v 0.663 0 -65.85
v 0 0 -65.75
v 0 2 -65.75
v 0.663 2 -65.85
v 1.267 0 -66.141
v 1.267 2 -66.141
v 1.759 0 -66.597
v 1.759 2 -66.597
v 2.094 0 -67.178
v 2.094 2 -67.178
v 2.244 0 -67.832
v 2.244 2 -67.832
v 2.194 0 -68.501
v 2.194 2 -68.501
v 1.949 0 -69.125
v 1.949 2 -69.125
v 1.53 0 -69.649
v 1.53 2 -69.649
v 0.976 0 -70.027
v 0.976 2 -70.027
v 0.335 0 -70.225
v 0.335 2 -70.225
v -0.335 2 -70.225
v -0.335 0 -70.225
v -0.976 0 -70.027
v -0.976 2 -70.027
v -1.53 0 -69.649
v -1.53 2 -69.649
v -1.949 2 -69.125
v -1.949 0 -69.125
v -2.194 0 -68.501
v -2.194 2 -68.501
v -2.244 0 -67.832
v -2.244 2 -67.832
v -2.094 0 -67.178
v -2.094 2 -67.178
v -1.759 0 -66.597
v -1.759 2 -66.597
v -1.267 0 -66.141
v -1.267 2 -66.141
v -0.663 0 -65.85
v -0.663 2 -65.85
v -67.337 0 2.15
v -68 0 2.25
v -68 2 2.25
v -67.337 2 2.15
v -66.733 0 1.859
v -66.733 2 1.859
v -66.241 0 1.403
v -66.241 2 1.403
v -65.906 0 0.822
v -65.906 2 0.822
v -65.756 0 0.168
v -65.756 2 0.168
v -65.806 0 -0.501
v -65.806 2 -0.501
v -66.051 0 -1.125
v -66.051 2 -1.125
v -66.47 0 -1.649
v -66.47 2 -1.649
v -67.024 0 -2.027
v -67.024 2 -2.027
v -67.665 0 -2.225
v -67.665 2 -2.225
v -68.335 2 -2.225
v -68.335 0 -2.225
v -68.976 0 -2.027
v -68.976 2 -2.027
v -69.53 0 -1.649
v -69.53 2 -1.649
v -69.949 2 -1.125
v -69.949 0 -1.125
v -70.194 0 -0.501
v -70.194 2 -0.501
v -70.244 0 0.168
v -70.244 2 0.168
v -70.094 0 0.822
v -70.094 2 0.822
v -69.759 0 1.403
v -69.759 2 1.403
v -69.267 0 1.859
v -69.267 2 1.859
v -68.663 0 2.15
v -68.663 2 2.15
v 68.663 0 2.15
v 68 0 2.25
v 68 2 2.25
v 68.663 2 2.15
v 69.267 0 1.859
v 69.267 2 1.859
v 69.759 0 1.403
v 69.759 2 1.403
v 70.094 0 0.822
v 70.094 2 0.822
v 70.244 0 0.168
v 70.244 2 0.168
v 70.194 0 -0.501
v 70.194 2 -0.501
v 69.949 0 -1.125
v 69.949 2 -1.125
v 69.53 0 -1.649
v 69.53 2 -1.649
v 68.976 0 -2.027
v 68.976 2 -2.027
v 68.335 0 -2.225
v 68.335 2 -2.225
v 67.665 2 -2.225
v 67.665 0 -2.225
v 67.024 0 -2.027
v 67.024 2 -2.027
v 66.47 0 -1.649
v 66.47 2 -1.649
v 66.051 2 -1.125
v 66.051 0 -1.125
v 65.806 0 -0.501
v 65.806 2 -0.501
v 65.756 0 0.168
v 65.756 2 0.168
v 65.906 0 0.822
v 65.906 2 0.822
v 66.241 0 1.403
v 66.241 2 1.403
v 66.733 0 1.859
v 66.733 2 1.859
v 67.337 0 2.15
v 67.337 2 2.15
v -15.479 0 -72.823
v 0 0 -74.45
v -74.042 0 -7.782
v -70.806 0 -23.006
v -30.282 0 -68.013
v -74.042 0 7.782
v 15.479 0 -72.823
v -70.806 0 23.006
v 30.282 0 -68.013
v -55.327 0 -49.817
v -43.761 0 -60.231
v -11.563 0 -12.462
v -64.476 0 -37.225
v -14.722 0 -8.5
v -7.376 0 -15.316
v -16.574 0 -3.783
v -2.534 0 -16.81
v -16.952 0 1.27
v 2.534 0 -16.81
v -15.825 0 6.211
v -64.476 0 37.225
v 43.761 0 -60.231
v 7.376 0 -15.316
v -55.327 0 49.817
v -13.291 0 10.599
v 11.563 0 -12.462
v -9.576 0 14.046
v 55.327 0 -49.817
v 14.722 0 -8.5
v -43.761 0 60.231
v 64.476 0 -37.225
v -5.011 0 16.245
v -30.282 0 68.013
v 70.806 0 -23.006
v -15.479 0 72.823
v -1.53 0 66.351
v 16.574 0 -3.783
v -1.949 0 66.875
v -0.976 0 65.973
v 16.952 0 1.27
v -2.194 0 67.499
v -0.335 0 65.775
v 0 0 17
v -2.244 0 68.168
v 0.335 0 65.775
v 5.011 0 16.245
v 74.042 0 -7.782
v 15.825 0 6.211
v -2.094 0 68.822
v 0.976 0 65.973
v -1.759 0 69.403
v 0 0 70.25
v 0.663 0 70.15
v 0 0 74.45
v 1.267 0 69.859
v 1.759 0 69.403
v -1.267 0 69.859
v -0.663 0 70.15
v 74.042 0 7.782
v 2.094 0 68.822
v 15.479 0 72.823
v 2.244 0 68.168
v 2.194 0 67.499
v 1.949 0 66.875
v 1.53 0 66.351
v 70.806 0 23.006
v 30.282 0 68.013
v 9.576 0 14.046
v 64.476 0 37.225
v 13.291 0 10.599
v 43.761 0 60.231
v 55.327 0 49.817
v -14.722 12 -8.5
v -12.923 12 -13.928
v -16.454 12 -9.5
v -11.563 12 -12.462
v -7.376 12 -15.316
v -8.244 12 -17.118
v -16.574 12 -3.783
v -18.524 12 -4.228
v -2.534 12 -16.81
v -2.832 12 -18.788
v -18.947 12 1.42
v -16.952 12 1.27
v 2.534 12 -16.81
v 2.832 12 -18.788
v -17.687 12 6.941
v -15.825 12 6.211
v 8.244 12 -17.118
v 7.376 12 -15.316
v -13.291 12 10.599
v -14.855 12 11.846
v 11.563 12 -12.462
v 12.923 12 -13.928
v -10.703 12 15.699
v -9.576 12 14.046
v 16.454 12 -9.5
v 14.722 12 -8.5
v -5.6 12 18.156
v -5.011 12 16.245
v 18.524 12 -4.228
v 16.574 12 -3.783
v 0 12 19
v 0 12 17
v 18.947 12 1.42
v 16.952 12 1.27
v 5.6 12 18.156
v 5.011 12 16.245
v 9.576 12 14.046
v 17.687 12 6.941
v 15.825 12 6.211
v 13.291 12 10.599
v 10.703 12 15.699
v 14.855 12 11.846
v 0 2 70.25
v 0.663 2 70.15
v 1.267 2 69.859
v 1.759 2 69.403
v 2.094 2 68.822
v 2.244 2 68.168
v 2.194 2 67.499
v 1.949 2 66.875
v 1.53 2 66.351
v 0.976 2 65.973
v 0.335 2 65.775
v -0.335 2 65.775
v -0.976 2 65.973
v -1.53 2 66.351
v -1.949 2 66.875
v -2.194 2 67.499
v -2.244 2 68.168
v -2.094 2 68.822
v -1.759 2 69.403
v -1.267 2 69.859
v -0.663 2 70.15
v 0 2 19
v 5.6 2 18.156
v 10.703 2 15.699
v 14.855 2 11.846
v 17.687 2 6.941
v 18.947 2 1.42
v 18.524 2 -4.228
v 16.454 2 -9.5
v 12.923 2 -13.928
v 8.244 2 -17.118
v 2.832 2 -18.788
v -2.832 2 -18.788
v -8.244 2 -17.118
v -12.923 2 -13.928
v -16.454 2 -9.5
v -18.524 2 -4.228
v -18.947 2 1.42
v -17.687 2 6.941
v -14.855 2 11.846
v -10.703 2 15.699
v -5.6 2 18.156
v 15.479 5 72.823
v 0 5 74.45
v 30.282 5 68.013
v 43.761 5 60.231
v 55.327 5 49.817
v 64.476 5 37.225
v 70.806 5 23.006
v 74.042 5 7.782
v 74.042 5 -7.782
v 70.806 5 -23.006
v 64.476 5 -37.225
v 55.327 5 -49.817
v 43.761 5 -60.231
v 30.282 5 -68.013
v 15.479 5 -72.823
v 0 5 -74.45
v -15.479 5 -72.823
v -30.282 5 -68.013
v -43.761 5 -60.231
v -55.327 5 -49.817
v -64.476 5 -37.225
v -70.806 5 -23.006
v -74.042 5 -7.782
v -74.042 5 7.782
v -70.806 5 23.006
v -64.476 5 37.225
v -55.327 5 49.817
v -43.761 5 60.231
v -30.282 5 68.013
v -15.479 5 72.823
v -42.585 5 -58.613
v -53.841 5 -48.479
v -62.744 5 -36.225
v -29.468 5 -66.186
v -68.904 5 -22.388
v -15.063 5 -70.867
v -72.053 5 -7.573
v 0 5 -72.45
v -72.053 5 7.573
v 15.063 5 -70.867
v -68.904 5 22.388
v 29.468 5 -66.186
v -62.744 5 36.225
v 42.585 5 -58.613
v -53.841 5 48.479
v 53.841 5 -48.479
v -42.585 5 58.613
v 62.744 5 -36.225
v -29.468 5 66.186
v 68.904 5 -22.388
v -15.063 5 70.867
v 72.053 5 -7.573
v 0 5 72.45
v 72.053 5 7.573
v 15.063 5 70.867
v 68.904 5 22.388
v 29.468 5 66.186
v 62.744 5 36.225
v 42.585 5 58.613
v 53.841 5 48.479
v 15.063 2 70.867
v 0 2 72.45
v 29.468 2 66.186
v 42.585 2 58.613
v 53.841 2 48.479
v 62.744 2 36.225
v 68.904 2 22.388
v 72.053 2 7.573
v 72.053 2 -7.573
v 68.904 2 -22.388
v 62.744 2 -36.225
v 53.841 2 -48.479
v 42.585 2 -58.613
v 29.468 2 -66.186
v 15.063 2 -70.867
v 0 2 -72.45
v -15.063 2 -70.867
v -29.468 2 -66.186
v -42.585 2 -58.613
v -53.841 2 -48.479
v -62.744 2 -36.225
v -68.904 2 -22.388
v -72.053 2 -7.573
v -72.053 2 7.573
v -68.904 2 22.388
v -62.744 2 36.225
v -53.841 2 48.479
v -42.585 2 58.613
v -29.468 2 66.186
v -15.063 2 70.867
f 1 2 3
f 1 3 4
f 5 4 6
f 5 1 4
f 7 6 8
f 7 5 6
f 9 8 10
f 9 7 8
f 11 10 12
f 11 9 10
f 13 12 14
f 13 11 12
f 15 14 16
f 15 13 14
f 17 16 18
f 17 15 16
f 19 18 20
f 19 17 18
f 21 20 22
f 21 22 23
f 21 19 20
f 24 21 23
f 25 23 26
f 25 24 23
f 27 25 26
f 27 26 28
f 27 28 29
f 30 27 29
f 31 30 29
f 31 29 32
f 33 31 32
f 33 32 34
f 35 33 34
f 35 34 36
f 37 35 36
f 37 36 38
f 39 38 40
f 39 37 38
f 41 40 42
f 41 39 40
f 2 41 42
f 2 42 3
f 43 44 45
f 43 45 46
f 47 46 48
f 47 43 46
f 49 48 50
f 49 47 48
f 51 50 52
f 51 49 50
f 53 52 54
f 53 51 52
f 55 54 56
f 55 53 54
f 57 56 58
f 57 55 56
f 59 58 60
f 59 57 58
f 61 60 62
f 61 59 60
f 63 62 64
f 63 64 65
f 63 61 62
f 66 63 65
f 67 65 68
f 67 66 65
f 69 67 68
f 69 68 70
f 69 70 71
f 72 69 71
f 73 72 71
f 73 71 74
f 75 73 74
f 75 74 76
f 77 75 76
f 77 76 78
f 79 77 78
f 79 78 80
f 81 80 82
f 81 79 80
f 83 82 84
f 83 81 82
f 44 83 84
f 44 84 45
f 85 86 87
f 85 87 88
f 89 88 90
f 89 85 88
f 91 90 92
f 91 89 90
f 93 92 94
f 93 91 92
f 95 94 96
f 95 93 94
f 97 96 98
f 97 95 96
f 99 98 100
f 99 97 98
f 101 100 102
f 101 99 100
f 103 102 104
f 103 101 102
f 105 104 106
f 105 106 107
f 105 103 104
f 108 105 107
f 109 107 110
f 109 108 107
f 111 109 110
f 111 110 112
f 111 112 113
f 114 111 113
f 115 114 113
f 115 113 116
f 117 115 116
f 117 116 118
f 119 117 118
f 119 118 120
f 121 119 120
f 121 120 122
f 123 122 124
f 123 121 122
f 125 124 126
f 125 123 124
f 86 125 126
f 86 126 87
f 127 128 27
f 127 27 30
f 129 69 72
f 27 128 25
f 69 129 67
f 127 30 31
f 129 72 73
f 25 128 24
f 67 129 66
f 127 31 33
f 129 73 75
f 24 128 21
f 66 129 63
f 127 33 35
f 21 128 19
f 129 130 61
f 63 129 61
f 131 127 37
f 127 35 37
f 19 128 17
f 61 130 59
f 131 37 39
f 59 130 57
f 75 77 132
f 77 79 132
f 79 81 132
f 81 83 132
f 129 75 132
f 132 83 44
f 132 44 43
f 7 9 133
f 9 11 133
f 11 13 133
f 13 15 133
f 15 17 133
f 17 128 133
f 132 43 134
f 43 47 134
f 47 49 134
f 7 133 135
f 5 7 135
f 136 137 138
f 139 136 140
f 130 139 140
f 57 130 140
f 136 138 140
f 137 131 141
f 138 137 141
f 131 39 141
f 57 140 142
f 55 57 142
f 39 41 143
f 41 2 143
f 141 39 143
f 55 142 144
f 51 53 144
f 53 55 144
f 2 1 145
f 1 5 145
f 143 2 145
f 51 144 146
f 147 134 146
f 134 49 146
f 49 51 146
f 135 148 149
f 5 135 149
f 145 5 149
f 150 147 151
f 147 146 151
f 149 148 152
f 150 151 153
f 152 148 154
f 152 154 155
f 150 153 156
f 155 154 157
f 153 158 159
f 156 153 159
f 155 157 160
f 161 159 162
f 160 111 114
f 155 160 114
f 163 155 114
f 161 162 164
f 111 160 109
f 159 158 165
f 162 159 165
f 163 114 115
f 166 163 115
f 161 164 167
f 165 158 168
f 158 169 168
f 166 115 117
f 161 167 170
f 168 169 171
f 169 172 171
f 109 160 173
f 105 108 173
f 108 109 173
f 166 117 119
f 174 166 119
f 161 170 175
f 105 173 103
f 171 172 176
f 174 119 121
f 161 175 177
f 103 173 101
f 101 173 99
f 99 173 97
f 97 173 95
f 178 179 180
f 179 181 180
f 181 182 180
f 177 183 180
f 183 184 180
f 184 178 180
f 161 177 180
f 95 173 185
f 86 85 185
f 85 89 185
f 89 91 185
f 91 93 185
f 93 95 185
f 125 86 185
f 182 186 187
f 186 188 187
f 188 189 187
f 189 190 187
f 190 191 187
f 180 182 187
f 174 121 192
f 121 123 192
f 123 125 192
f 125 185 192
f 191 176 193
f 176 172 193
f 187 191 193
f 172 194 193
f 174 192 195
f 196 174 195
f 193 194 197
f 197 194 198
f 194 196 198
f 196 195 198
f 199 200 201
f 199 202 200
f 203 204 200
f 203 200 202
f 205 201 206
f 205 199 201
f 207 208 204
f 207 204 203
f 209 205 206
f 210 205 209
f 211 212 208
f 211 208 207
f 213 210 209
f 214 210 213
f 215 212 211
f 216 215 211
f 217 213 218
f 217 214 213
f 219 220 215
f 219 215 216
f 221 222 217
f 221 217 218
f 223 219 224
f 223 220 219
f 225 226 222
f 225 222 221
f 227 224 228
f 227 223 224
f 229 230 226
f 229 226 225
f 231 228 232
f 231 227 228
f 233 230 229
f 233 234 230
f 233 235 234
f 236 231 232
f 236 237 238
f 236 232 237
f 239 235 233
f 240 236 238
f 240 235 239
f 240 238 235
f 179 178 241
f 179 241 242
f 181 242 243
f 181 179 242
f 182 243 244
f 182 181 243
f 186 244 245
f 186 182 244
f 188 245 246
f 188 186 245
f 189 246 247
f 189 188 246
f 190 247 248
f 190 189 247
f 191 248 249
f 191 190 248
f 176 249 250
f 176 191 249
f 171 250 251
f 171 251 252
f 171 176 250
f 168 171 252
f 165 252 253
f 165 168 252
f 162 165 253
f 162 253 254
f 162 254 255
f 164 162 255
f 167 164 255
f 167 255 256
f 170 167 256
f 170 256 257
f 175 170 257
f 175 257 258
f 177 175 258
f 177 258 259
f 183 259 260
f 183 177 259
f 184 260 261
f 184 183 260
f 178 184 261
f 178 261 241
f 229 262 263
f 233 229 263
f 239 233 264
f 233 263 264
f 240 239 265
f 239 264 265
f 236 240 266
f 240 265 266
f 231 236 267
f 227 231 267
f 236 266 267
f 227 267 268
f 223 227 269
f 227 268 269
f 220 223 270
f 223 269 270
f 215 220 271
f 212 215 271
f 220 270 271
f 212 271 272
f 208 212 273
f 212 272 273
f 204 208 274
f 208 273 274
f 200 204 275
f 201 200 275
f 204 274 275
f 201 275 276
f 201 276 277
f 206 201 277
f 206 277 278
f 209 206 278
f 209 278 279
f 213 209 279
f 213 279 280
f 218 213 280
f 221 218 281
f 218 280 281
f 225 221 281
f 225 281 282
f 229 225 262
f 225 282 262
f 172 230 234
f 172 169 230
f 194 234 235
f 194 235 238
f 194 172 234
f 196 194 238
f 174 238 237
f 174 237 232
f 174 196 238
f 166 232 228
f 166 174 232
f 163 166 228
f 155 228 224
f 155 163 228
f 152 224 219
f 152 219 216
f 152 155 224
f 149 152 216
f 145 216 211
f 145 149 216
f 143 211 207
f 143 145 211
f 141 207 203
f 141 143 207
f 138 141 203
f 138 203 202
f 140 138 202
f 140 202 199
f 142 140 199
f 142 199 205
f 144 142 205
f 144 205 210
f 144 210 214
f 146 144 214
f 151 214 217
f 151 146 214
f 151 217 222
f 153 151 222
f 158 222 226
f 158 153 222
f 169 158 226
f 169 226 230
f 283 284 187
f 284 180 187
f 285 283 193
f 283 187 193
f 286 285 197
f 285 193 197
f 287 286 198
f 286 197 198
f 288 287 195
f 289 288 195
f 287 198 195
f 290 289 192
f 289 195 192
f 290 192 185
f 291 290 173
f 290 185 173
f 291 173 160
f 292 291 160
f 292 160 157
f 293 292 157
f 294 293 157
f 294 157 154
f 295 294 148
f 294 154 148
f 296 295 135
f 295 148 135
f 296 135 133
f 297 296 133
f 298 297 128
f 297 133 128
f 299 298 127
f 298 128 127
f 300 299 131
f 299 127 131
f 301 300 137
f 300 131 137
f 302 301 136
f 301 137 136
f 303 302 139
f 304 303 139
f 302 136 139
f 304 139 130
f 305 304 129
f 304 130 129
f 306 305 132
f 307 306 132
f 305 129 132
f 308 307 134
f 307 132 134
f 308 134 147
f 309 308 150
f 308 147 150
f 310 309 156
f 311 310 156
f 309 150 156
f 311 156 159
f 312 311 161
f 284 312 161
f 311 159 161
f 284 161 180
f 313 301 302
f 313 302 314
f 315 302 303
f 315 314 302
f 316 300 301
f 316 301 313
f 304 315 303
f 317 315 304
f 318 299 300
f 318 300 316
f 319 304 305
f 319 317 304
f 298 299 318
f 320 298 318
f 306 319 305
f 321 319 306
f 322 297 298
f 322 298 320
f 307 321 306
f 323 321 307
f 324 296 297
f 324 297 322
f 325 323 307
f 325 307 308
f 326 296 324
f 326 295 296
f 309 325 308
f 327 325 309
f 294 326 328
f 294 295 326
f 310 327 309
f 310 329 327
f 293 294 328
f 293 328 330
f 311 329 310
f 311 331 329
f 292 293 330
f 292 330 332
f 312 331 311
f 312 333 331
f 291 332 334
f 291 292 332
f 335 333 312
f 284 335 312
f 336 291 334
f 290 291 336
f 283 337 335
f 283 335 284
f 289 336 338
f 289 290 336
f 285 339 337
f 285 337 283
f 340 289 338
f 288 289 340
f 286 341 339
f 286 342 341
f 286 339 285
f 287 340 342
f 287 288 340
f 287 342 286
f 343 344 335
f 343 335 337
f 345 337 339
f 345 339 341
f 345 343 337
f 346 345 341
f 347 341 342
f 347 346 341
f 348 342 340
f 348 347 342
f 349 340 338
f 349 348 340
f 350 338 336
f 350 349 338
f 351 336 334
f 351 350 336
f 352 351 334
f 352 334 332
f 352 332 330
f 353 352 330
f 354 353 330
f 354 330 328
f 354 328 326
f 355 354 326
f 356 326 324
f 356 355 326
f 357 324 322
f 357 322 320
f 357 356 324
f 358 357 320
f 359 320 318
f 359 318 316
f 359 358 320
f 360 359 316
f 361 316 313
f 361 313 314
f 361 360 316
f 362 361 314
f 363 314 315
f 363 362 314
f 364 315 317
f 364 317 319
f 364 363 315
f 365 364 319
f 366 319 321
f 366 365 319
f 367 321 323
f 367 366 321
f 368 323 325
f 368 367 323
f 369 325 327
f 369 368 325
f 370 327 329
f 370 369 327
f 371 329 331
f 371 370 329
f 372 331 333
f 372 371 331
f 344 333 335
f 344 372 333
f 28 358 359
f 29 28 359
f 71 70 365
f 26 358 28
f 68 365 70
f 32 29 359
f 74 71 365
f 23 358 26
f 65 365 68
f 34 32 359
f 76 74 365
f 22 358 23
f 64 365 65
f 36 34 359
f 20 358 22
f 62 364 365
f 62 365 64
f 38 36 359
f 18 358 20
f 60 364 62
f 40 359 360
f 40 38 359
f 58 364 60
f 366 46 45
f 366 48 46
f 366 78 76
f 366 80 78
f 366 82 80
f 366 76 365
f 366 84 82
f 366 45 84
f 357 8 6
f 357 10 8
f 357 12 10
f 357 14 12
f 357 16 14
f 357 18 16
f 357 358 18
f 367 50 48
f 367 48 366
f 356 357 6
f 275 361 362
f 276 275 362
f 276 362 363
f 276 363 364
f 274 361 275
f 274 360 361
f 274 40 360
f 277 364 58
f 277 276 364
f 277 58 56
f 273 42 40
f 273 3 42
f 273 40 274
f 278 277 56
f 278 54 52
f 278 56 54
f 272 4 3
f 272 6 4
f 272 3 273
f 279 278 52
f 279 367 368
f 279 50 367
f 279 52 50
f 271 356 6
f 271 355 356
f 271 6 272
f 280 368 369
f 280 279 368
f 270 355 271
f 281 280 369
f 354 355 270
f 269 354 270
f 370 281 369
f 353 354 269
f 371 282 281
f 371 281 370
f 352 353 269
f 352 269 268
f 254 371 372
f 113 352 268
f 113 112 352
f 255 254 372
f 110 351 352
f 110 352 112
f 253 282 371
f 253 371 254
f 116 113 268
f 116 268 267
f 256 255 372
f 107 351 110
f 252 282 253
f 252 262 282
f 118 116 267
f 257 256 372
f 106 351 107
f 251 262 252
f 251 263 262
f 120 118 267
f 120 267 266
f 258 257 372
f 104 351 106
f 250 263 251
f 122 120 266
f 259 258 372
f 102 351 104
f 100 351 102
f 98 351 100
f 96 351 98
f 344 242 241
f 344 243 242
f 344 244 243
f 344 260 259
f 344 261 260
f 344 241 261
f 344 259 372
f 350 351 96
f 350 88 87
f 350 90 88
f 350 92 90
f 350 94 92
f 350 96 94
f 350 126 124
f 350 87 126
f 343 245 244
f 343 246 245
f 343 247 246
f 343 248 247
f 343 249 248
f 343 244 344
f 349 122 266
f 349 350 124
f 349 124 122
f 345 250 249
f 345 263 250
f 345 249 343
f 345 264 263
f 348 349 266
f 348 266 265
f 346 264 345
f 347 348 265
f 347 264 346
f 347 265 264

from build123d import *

# Parameters (mm, degrees)
SKETCH1_R           = 74.45
SKETCH1_R_2         = 2.25
SKETCH1_R_3         = 17
BOSS_EXTRUDE1_DEPTH = 2
SKETCH2_R           = 19
SKETCH2_R_2         = 17
BOSS_EXTRUDE2_DEPTH = 10
SKETCH3_R           = 74.45
SKETCH3_R_2         = 72.45
BOSS_EXTRUDE3_DEPTH = 3


with BuildPart() as part:
    # Sketch1 → Boss-Extrude1 (new body)
    with BuildSketch(Plane(origin=(0, 0, 0), x_dir=(1, 0, 0), z_dir=(0, 1, 0))):
        with Locations(Location((0, 0, 0), (0, 0, 270))):
            Circle(SKETCH1_R)
        with Locations(Location((68, 0, 0), (0, 0, 270))):
            Circle(SKETCH1_R_2, mode=Mode.SUBTRACT)
        with Locations(Location((0, -68, 0), (0, 0, 270))):
            Circle(SKETCH1_R_2, mode=Mode.SUBTRACT)
        with Locations(Location((-68, 0, 0), (0, 0, 270))):
            Circle(SKETCH1_R_2, mode=Mode.SUBTRACT)
        with Locations(Location((0, 68, 0), (0, 0, 270))):
            Circle(SKETCH1_R_2, mode=Mode.SUBTRACT)
        with Locations(Location((0, 0, 0), (0, 0, 270))):
            Circle(SKETCH1_R_3, mode=Mode.SUBTRACT)
    extrude(amount=BOSS_EXTRUDE1_DEPTH)

    # Sketch2 → Boss-Extrude2 (add)
    with BuildSketch(Plane(origin=(0, 2, 0), x_dir=(1, 0, 0), z_dir=(0, 1, 0))):
        with Locations(Location((0, 0, 0), (0, 0, 270))):
            Circle(SKETCH2_R)
        with Locations(Location((0, 0, 0), (0, 0, 270))):
            Circle(SKETCH2_R_2, mode=Mode.SUBTRACT)
    extrude(amount=BOSS_EXTRUDE2_DEPTH)

    # Sketch3 → Boss-Extrude3 (add)
    with BuildSketch(Plane(origin=(0, 2, 0), x_dir=(1, 0, 0), z_dir=(0, 1, 0))):
        with Locations(Location((0, 0, 0), (0, 0, 270))):
            Circle(SKETCH3_R)
        with Locations(Location((0, 0, 0), (0, 0, 270))):
            Circle(SKETCH3_R_2, mode=Mode.SUBTRACT)
    extrude(amount=BOSS_EXTRUDE3_DEPTH)


solid = part.part
